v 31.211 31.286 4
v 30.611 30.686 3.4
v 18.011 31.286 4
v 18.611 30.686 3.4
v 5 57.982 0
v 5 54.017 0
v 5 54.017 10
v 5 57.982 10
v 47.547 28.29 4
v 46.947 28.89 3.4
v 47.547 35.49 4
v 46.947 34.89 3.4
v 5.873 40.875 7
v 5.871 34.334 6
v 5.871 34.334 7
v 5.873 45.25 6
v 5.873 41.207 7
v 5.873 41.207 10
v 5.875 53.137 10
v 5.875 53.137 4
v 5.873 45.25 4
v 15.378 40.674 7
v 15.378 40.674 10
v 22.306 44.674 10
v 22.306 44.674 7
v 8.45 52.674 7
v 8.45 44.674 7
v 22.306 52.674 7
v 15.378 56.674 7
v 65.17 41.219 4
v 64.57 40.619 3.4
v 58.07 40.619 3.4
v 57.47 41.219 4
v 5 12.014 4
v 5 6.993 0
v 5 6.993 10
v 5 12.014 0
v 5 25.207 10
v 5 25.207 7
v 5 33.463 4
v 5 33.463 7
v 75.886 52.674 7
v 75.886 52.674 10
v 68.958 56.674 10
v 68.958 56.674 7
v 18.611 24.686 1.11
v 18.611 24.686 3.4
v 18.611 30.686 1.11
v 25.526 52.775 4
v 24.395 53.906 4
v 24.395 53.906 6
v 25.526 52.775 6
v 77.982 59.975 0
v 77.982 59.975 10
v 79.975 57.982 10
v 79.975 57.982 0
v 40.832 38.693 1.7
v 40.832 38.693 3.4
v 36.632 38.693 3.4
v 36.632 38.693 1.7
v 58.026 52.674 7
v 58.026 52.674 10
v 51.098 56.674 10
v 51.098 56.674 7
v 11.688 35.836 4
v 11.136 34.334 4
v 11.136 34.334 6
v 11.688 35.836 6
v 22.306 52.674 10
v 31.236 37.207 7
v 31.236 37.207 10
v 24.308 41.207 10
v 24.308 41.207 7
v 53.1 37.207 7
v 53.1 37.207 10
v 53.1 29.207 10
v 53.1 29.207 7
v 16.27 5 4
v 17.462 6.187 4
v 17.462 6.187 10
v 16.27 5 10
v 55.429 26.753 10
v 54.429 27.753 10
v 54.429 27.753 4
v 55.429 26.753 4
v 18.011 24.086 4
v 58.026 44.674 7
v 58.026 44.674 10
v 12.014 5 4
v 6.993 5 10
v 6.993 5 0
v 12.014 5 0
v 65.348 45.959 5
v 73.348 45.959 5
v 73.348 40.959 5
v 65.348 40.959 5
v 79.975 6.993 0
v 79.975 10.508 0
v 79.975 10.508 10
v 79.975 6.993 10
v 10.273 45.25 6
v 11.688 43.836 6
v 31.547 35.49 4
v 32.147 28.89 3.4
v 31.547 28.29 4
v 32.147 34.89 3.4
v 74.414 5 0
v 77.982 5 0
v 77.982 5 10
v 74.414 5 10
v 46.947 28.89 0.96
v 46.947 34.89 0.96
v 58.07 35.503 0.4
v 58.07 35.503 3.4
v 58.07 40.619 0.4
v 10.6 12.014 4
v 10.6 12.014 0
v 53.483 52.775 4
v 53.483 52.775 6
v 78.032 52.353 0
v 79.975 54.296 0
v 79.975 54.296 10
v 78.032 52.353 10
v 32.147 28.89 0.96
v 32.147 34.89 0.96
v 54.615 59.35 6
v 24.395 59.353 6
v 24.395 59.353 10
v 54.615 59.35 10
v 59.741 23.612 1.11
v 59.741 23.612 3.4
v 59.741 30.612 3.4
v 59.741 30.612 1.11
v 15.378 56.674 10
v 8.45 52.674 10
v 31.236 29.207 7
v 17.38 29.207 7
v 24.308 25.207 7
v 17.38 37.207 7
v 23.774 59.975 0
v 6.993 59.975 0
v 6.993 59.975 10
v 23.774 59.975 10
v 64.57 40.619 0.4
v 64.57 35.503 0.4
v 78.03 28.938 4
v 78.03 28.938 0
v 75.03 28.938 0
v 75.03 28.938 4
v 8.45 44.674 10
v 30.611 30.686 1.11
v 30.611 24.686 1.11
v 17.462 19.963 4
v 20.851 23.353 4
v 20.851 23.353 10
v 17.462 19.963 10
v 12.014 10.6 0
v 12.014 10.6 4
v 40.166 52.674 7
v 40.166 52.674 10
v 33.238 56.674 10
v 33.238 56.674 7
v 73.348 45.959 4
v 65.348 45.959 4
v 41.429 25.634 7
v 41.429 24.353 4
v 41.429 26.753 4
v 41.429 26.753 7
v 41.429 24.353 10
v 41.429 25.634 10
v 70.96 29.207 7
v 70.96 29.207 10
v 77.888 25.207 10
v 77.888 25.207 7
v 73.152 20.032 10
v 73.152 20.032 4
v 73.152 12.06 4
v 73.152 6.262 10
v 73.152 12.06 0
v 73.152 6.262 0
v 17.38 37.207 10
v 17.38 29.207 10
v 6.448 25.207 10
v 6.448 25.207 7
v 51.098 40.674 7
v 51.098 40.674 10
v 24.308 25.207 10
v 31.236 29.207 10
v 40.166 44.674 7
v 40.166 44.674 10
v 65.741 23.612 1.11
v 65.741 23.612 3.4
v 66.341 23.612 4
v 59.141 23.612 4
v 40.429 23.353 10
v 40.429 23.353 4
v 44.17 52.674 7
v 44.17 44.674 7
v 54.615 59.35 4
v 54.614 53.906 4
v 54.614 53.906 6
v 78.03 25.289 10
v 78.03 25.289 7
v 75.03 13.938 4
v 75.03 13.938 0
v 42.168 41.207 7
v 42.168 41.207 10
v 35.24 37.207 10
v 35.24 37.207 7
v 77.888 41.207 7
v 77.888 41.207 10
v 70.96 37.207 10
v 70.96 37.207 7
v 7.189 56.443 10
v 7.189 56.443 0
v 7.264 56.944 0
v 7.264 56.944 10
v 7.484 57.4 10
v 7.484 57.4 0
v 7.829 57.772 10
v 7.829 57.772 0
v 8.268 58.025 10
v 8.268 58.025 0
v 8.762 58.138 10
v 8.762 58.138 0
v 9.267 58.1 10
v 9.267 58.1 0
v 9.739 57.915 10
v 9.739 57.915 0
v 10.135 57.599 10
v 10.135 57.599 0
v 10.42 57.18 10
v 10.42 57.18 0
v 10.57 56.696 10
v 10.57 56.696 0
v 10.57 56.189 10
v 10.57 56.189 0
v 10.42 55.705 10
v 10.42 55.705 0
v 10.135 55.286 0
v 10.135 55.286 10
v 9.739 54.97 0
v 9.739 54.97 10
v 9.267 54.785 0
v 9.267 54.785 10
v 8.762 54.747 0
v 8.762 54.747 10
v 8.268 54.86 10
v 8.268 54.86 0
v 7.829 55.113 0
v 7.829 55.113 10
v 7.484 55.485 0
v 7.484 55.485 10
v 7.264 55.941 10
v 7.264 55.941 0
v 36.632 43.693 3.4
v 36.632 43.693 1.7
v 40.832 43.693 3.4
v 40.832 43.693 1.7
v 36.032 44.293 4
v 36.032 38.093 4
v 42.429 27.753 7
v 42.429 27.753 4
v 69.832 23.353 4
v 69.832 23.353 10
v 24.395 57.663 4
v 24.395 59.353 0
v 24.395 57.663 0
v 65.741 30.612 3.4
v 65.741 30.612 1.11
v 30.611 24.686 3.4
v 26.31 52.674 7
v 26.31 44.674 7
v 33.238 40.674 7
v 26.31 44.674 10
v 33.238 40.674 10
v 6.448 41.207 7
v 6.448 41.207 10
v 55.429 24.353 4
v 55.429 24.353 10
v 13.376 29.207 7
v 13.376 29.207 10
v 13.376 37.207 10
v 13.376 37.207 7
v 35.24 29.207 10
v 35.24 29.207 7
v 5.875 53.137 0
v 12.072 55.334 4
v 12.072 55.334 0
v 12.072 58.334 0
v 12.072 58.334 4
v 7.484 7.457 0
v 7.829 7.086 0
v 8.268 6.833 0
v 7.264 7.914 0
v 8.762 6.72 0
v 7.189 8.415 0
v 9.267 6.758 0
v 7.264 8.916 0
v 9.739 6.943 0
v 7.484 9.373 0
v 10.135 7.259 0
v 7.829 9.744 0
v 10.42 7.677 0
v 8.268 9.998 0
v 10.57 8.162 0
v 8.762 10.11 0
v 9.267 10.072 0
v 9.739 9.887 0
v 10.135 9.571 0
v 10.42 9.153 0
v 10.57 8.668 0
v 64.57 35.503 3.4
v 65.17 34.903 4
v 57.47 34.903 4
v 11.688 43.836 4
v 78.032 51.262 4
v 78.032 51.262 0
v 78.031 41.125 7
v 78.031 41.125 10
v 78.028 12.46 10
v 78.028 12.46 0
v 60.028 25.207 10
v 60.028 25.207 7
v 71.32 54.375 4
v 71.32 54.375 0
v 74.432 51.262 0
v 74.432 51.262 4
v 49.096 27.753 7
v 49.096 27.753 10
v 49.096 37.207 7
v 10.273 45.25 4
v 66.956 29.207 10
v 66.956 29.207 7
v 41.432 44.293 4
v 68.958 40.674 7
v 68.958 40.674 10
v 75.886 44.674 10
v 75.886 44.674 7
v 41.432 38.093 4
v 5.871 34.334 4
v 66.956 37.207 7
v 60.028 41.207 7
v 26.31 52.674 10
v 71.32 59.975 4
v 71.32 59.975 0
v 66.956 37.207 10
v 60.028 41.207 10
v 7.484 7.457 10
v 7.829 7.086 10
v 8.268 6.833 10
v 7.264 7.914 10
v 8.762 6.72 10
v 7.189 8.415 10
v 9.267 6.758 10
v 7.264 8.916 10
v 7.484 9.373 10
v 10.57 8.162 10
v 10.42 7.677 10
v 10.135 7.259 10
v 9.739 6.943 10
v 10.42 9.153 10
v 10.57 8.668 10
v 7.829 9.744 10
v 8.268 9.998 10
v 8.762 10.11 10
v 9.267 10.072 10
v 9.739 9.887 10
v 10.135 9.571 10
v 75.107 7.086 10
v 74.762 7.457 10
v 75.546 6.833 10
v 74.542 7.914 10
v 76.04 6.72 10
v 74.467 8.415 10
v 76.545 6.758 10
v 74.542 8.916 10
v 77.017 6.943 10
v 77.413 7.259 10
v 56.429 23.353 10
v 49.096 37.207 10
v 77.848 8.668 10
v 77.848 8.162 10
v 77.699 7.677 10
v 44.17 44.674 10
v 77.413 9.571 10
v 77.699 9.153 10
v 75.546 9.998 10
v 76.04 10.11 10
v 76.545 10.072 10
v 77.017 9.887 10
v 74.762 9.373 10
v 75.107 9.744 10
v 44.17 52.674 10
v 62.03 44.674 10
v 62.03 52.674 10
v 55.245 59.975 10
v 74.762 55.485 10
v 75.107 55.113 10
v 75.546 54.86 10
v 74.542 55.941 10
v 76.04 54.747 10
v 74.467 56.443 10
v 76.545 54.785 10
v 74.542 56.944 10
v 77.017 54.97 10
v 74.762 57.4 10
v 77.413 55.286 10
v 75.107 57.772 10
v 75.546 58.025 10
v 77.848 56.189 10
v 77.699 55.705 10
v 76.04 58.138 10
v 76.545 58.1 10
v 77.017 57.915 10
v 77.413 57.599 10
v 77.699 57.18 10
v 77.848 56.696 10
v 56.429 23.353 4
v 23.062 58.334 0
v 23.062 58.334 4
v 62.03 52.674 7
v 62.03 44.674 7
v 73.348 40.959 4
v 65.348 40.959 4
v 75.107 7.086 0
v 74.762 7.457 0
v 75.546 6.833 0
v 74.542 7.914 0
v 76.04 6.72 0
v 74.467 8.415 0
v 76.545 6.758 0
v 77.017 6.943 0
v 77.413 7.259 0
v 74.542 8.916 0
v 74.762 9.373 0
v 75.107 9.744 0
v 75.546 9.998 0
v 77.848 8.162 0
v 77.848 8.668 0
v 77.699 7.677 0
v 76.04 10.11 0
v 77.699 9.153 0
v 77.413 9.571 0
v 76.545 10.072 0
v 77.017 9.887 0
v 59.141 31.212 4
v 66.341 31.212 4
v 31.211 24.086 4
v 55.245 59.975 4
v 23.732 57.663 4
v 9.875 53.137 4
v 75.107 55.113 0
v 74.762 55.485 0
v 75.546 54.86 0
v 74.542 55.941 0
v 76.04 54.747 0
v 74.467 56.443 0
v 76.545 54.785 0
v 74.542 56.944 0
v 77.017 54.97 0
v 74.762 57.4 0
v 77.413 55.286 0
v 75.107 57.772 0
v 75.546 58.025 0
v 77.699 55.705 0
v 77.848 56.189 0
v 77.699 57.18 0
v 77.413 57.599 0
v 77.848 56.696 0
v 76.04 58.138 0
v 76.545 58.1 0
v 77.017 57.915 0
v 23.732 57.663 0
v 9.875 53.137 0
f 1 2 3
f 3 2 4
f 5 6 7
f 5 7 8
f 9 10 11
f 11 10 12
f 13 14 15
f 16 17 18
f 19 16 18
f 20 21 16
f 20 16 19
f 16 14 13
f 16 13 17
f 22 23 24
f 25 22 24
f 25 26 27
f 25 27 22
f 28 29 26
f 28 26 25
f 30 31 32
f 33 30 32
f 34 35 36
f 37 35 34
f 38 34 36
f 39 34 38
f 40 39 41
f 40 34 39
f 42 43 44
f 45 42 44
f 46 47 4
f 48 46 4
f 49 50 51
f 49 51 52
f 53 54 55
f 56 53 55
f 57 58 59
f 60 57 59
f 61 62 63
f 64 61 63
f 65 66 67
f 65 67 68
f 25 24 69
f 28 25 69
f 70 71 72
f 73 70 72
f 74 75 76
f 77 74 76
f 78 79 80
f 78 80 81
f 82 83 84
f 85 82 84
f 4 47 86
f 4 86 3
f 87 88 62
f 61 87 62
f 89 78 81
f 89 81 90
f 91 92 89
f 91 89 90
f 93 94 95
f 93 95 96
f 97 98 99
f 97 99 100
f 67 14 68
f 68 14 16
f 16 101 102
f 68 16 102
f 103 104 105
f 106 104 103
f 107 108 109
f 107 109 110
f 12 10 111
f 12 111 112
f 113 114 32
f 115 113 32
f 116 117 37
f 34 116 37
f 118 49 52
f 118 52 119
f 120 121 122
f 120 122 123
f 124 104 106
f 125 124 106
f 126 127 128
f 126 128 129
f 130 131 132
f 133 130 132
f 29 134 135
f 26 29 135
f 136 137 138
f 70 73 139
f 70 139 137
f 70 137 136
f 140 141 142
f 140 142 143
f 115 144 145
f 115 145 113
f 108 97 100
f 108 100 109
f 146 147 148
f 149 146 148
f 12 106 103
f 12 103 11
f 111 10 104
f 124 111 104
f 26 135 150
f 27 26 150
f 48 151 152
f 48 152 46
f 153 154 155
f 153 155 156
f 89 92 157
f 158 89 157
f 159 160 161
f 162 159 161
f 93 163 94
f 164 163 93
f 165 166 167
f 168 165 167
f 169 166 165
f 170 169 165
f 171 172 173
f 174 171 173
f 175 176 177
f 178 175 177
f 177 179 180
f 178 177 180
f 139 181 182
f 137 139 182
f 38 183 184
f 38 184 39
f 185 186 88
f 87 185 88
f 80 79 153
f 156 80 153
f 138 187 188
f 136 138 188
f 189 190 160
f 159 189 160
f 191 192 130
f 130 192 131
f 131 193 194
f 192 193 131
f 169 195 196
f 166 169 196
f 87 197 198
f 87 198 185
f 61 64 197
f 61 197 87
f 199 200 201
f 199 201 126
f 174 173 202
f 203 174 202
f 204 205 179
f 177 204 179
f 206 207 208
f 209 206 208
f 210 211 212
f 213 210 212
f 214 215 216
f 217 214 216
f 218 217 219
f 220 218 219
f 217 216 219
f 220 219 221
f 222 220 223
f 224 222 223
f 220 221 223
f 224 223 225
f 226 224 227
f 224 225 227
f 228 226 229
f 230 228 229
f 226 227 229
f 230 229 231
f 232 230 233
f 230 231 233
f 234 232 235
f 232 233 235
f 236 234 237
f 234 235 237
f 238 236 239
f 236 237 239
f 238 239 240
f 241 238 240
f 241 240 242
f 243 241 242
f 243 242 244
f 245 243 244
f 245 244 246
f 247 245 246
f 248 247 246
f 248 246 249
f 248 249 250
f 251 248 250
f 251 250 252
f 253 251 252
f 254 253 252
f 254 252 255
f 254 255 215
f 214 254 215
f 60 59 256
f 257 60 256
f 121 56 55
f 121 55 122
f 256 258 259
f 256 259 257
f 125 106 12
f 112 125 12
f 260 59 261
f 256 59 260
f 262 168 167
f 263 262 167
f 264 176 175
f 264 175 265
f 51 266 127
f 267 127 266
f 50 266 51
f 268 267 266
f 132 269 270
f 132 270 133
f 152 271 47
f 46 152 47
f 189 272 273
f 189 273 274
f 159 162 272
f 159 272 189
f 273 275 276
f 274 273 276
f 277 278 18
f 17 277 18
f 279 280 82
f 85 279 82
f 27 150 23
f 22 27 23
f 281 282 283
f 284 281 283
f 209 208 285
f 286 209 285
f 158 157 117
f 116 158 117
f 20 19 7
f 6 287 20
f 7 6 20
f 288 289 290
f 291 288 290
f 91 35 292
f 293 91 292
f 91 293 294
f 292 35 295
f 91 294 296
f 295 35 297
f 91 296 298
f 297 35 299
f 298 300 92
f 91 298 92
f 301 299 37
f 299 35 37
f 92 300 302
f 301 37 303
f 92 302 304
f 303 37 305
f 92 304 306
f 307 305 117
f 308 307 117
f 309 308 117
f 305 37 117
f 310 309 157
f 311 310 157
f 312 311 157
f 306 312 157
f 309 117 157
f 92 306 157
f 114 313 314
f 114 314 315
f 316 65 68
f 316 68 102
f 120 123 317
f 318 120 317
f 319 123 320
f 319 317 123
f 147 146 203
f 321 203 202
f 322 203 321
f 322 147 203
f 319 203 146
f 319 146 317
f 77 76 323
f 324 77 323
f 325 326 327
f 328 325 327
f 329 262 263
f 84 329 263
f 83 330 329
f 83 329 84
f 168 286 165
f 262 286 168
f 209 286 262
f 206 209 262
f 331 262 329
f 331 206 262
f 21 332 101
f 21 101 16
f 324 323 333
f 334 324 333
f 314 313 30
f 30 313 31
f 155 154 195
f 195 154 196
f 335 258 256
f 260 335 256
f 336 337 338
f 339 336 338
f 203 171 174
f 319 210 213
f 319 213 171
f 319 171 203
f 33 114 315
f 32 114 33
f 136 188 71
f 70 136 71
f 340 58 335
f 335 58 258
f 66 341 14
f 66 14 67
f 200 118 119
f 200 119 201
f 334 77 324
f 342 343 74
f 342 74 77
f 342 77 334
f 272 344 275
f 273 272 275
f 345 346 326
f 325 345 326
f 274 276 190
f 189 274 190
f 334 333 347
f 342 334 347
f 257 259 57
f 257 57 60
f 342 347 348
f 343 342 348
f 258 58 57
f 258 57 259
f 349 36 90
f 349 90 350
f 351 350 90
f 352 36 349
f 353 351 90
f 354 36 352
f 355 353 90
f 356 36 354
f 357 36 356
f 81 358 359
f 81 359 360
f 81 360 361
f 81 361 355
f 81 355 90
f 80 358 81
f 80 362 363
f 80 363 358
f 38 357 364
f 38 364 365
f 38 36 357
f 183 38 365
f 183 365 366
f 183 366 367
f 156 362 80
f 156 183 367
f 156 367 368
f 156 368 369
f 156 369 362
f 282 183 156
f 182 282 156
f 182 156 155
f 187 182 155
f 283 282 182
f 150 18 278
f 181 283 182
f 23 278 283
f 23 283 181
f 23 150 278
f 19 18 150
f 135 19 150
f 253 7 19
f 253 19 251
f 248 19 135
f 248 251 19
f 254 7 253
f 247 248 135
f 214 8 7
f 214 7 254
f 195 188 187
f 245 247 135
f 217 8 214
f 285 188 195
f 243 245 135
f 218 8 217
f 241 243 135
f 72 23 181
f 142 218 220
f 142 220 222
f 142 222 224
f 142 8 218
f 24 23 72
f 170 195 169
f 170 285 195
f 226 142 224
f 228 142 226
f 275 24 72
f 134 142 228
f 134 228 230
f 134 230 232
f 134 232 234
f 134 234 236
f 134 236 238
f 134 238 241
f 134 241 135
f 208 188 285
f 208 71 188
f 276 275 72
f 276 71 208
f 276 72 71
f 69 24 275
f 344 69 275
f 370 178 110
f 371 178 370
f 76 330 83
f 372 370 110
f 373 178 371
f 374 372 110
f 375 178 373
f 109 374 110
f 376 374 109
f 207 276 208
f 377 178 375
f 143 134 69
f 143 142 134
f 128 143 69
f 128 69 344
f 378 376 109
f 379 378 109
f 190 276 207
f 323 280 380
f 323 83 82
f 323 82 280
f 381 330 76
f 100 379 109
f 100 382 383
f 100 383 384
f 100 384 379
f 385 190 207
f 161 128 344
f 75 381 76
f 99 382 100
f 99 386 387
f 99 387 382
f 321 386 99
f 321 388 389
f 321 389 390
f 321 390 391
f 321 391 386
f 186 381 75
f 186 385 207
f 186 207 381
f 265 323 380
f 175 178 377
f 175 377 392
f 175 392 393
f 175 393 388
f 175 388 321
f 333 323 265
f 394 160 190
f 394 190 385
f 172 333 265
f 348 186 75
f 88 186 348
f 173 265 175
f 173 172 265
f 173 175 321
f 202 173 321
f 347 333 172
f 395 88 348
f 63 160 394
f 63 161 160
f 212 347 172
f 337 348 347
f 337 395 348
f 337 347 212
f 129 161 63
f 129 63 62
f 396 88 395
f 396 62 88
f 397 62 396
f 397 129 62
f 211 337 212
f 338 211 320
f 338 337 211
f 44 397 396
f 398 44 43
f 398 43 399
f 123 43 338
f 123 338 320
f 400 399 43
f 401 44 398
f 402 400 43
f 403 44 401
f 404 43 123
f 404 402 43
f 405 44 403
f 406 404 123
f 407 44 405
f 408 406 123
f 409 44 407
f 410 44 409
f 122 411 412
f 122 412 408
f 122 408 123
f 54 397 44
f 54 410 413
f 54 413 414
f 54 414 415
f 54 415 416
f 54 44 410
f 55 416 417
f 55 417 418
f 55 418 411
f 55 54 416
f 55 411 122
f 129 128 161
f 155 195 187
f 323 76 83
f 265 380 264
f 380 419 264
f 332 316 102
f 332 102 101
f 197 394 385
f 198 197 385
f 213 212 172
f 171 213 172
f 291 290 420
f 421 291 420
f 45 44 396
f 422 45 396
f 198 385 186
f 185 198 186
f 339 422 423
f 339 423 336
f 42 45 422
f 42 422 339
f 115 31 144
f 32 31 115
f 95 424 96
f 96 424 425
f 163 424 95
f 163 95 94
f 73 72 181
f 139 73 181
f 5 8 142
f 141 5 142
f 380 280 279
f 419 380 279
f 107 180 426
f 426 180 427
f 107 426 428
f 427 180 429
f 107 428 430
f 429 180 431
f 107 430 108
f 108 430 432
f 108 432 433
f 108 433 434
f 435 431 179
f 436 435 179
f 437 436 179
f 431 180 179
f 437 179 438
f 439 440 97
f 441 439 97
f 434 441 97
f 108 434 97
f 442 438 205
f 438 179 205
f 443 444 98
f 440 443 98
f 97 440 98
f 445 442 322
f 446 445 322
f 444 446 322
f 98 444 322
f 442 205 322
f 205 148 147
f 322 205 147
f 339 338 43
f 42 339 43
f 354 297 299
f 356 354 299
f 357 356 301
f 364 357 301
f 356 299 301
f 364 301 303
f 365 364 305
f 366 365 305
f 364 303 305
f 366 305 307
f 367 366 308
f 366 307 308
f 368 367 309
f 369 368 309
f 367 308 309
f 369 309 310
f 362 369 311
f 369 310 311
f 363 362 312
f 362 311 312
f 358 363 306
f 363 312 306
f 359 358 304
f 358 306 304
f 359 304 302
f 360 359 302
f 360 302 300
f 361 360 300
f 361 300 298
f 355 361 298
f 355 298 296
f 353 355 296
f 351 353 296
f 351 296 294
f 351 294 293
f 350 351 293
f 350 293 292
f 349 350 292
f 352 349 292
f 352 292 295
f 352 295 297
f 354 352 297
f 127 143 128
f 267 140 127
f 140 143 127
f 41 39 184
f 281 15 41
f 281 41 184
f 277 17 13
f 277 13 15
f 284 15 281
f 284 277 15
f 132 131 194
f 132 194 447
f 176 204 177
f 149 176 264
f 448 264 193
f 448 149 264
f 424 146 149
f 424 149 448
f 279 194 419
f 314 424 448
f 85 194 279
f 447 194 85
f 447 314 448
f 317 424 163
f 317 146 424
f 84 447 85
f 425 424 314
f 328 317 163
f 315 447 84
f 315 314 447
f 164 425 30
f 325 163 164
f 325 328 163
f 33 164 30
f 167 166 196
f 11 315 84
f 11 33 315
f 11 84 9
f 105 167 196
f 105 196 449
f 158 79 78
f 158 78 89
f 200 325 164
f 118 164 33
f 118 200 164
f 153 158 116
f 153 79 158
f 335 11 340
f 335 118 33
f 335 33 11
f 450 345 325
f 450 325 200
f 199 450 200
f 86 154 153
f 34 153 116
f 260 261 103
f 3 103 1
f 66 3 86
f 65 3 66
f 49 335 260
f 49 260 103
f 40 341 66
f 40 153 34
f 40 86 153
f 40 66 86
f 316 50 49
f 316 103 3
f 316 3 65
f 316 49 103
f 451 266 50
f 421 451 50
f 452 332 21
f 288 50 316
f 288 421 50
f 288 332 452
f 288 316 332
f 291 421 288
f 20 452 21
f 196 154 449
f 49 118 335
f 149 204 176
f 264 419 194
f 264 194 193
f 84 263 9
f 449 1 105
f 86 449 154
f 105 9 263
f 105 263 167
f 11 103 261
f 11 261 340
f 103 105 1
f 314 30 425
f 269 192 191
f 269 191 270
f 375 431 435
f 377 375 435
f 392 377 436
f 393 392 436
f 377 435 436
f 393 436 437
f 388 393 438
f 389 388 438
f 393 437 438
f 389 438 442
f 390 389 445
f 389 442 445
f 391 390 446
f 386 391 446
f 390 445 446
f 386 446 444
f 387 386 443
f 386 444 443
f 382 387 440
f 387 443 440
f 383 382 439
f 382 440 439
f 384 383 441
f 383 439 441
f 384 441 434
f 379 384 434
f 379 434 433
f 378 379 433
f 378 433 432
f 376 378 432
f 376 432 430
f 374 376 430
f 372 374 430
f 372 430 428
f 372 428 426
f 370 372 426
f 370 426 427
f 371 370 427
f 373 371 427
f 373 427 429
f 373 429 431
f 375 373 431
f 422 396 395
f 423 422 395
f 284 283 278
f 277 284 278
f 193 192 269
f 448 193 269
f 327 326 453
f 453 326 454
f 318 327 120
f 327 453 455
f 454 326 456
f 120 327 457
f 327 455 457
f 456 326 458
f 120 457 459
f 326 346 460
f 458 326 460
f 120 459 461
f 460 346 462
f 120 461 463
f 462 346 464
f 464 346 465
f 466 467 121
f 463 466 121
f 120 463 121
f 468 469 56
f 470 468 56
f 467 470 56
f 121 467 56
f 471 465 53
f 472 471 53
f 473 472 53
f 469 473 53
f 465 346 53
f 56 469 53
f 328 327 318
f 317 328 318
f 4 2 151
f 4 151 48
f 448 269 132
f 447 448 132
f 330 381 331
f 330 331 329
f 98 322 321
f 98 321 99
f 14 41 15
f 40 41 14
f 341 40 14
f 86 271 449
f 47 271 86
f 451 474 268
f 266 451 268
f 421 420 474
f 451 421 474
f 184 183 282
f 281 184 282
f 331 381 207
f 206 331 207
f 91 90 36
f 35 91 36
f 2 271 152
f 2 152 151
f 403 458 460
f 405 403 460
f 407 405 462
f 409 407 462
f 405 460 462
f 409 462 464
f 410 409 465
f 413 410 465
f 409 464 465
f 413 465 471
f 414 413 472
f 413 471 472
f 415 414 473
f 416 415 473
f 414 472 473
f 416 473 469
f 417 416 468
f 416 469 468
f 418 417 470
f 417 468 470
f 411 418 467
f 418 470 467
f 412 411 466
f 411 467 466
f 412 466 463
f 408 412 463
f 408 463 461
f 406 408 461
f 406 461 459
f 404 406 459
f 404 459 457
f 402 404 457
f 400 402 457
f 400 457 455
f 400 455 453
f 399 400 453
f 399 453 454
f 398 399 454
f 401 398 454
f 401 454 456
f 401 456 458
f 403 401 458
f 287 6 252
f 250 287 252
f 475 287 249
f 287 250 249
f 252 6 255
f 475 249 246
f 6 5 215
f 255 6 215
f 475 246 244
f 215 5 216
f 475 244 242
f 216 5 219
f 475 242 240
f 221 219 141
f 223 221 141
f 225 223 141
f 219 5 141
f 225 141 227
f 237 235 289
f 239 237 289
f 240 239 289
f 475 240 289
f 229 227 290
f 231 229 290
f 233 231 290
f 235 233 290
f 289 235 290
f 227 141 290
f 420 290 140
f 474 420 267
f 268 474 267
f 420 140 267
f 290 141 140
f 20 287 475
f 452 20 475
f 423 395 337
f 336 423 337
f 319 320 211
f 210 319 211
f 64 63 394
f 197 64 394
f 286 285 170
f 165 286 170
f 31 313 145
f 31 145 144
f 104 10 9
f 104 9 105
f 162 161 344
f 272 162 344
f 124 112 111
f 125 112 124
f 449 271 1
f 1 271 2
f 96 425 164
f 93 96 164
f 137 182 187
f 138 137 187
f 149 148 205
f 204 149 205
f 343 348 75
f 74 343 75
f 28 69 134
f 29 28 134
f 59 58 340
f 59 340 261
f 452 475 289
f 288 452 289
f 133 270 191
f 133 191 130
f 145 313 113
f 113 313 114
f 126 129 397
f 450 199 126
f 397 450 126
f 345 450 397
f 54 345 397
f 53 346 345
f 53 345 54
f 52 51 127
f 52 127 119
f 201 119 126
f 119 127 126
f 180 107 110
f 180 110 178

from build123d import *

# Parameters (mm, degrees)
SKETCH_1_W           = 85
SKETCH_1_H           = 65
EXTRUDE_1_DEPTH      = 10
CUT_EXTRUDE_1_REACH  = 109.471
SKETCH_2_R           = 1.7
CUT_EXTRUDE_2_REACH  = 109.471
SKETCH_3_W           = 85
SKETCH_3_H           = 65
CUT_EXTRUDE_4_REACH  = 102.464
CUT_EXTRUDE_7_DEPTH  = 6
CUT_EXTRUDE_8_DEPTH  = 6
CUT_EXTRUDE_11_DEPTH = 4
SKETCH_8_W           = 8
SKETCH_8_H           = 5
CUT_EXTRUDE_12_DEPTH = 1
SKETCH_10_W          = 5.4
SKETCH_10_H          = 6
SKETCH_10_W_2        = 4
EXTRUDE_2_DEPTH      = 3.04
SKETCH_11_W          = 4.2
SKETCH_11_H          = 5
EXTRUDE_3_DEPTH      = 2.300115
SKETCH_12_W          = 12
SKETCH_12_H          = 6
EXTRUDE_4_DEPTH      = 2.89
SKETCH_13_W          = 6.499986347
SKETCH_13_H          = 5.115524378
EXTRUDE_5_DEPTH      = 3.6
SKETCH_14_W          = 6
SKETCH_14_H          = 7
EXTRUDE_6_DEPTH      = 2.890002
SKETCH_15_W          = 14
SKETCH_15_H          = 4.4
CUT_EXTRUDE_13_DEPTH = 6
CHAMFER_1_SIZE       = 1
CHAMFER_2_SIZE       = 0.6
CHAMFER_3_SIZE       = 0.6
CHAMFER_4_SIZE       = 0.6
CHAMFER_5_SIZE       = 0.6
CHAMFER_6_SIZE       = 0.6
CUT_EXTRUDE_15_DEPTH = 3
CUT_EXTRUDE_16_DEPTH = 3


with BuildPart() as part:
    # 草图1 → 凸台-拉伸1 (new body)
    with BuildSketch(Plane.XY):
        with Locations((42.5, 32.5)):
            Rectangle(SKETCH_1_W, SKETCH_1_H)
    extrude(amount=EXTRUDE_1_DEPTH)

    # 草图2 → 切除-拉伸1 (cut, up to next)
    with BuildSketch(Plane(origin=(0, 0, 0), x_dir=(-1, 0, 0), z_dir=(0, 0, -1)), mode=Mode.PRIVATE) as cut_extrude_1_sk1:
        with Locations((-76.166921514, 56.442524765)):
            Circle(SKETCH_2_R)
    cut_extrude_1_tool1 = extrude(cut_extrude_1_sk1.sketch, amount=-CUT_EXTRUDE_1_REACH, mode=Mode.PRIVATE) & part.part
    # 草图2 → 切除-拉伸1 (cut, up to next)
    with BuildSketch(Plane(origin=(0, 0, 0), x_dir=(-1, 0, 0), z_dir=(0, 0, -1)), mode=Mode.PRIVATE) as cut_extrude_1_sk2:
        with Locations((-8.888803658, 56.442524765)):
            Circle(SKETCH_2_R)
    cut_extrude_1_tool2 = extrude(cut_extrude_1_sk2.sketch, amount=-CUT_EXTRUDE_1_REACH, mode=Mode.PRIVATE) & part.part
    # 草图2 → 切除-拉伸1 (cut, up to next)
    with BuildSketch(Plane(origin=(0, 0, 0), x_dir=(-1, 0, 0), z_dir=(0, 0, -1)), mode=Mode.PRIVATE) as cut_extrude_1_sk3:
        with Locations((-76.166921514, 8.41508509)):
            Circle(SKETCH_2_R)
    cut_extrude_1_tool3 = extrude(cut_extrude_1_sk3.sketch, amount=-CUT_EXTRUDE_1_REACH, mode=Mode.PRIVATE) & part.part
    # 草图2 → 切除-拉伸1 (cut, up to next)
    with BuildSketch(Plane(origin=(0, 0, 0), x_dir=(-1, 0, 0), z_dir=(0, 0, -1)), mode=Mode.PRIVATE) as cut_extrude_1_sk4:
        with Locations((-8.888803658, 8.41508509)):
            Circle(SKETCH_2_R)
    cut_extrude_1_tool4 = extrude(cut_extrude_1_sk4.sketch, amount=-CUT_EXTRUDE_1_REACH, mode=Mode.PRIVATE) & part.part
    add(cut_extrude_1_tool1.solids().sort_by_distance((76.166922, 56.442525, 0))[0], mode=Mode.SUBTRACT)
    add(cut_extrude_1_tool2.solids().sort_by_distance((8.888804, 56.442525, 0))[0], mode=Mode.SUBTRACT)
    add(cut_extrude_1_tool3.solids().sort_by_distance((76.166922, 8.415085, 0))[0], mode=Mode.SUBTRACT)
    add(cut_extrude_1_tool4.solids().sort_by_distance((8.888804, 8.415085, 0))[0], mode=Mode.SUBTRACT)

    # 草图3 → 切除-拉伸2 (cut, up to next)
    with BuildSketch(Plane(origin=(0, 0, 0), x_dir=(-1, 0, 0), z_dir=(0, 0, -1)), mode=Mode.PRIVATE) as cut_extrude_2_sk1:
        with Locations((-42.5, 32.5)):
            Rectangle(SKETCH_3_W, SKETCH_3_H)
        Polygon((-5, 33.462892894), (-5.871324699, 34.334217592), (-5.87504445, 53.137061214), (-5, 54.017366187), (-5, 57.982143592), (-6.992565577, 59.974709169), (-23.773560915, 59.974709169), (-24.394872914, 59.353397171), (-54.61482093, 59.349677419), (-55.245113202, 59.974709169), (-77.982184232, 59.974709169), (-79.974749809, 57.982143592), (-79.97474981, 54.295829484), (-78.032030648, 52.353110322), (-78.028310897, 12.45999492), (-79.97474981, 10.508295484), (-79.97474981, 6.992565577), (-77.982184232, 5), (-74.414239441, 5), (-73.152434681, 6.26180476), (-60.043505207, 6.265524511), (-58.772720173, 5), (-32.926479725, 5), (-31.743585303, 6.182894422), (-17.461559563, 6.186614173), (-16.269684867, 5), (-6.992565577, 5), (-5, 6.992565577), align=None, mode=Mode.SUBTRACT)
    cut_extrude_2_tool1 = extrude(cut_extrude_2_sk1.sketch, amount=-CUT_EXTRUDE_2_REACH, mode=Mode.PRIVATE) & part.part
    add(cut_extrude_2_tool1.solids().sort_by_distance((42.5, 63.929953, 0))[0], mode=Mode.SUBTRACT)

    # 草图4 → 切除-拉伸4 (cut, up to next)
    with BuildSketch(Plane(origin=(0, 0, 0), x_dir=(-1, 0, 0), z_dir=(0, 0, -1)), mode=Mode.PRIVATE) as cut_extrude_4_sk1:
        Polygon((-73.152434681, 6.26180476), (-73.152434681, 20.032317315), (-69.831576581, 23.353175415), (-46.787984184, 23.353175415), (-20.851296271, 23.353175415), (-17.461559563, 19.963438707), (-17.461559563, 6.186614173), (-17.461559563, 0.193960815), (-73.152434681, 0.193960815), align=None)
    cut_extrude_4_tool1 = extrude(cut_extrude_4_sk1.sketch, amount=-CUT_EXTRUDE_4_REACH, mode=Mode.PRIVATE) & part.part
    add(cut_extrude_4_tool1.solids().sort_by_distance((45.311727, 11.681443, 0))[0], mode=Mode.SUBTRACT)

    # 草图5 → 切除-拉伸7 (cut)
    with BuildSketch(Plane(origin=(0, 0, 0), x_dir=(-1, 0, 0), z_dir=(0, 0, -1))):
        Polygon((-24.394872914, 59.353397171), (-24.394872914, 53.906418167), (-25.526104495, 52.774908066), (-53.482640788, 52.774908066), (-54.614150889, 53.906139647), (-54.61482093, 59.349677419), align=None)
    extrude(amount=-CUT_EXTRUDE_7_DEPTH, mode=Mode.SUBTRACT)

    # 草图6 → 切除-拉伸8 (cut)
    with BuildSketch(Plane(origin=(0, 0, 0), x_dir=(-1, 0, 0), z_dir=(0, 0, -1))):
        Polygon((-5.871324699, 34.334217592), (-11.136213102, 34.334217592), (-11.687697798, 35.836171197), (-11.687697798, 43.836171197), (-10.273484235, 45.250384759), (-5.873484235, 45.250384759), align=None)
    extrude(amount=-CUT_EXTRUDE_8_DEPTH, mode=Mode.SUBTRACT)

    # 草图7 → 切除-拉伸11 (cut)
    with BuildSketch(Plane(origin=(0, 0, 0), x_dir=(-1, 0, 0), z_dir=(0, 0, -1))):
        Polygon((-74.432117646, 51.26230094), (-76.432117646, 51.26230094), (-78.031928938, 51.26230094), (-78.029847328, 28.93771831), (-75.029847328, 28.93771831), (-75.029847328, 13.93771831), (-73.152434681, 12.060305663), (-73.152434681, 20.032317315), (-69.831576581, 23.353175415), (-20.851296271, 23.353175415), (-17.461559563, 19.963438707), (-17.461559563, 6.186614173), (-16.269684867, 5), (-12.014024847, 5), (-12.014024847, 10.599811284), (-10.599811284, 12.014024847), (-6.599811284, 12.014024847), (-5, 12.014024847), (-5, 33.462892894), (-5.871324699, 34.334217592), (-11.136213102, 34.334217592), (-11.687697798, 35.836171197), (-11.687697798, 43.836171197), (-10.273484235, 45.250384759), (-5.873484235, 45.250384759), (-5.87504445, 53.137061214), (-9.87504445, 53.137061214), (-12.071959353, 55.333976117), (-12.071959353, 58.333976117), (-23.061659554, 58.333976117), (-23.732127818, 57.663342778), (-24.394872914, 57.663261201), (-24.394872914, 53.906418167), (-25.526104495, 52.774908066), (-53.482640788, 52.774908066), (-54.614150889, 53.906139647), (-54.61482093, 59.349677419), (-55.245113202, 59.974709169), (-71.319520701, 59.974709169), (-71.319520701, 58.374897885), (-71.319520701, 54.374897885), align=None)
    extrude(amount=-CUT_EXTRUDE_11_DEPTH, mode=Mode.SUBTRACT)

    # 草图8 → 切除-拉伸12 (cut)
    with BuildSketch(Plane(origin=(0, 0, 4), x_dir=(-1, 0, 0), z_dir=(0, 0, -1))):
        with Locations((-69.348077333, 43.45871309)):
            Rectangle(SKETCH_8_W, SKETCH_8_H)
    extrude(amount=-CUT_EXTRUDE_12_DEPTH, mode=Mode.SUBTRACT)

    # 草图10 → 凸台-拉伸2 (add)
    with BuildSketch(Plane(origin=(0, 0, 4), x_dir=(-1, 0, 0), z_dir=(0, 0, -1))):
        with Locations((-44.246532103, 31.889800214)):
            Rectangle(SKETCH_10_W, SKETCH_10_H)
        with Locations((-39.546532103, 31.889800214)):
            Rectangle(SKETCH_10_W_2, SKETCH_10_H)
        with Locations((-34.846532103, 31.889800214)):
            Rectangle(SKETCH_10_W, SKETCH_10_H)
    extrude(amount=EXTRUDE_2_DEPTH)

    # 草图11 → 凸台-拉伸3 (add)
    with BuildSketch(Plane(origin=(0, 0, 4), x_dir=(-1, 0, 0), z_dir=(0, 0, -1))):
        with Locations((-38.731800654, 41.192864876)):
            Rectangle(SKETCH_11_W, SKETCH_11_H)
    extrude(amount=EXTRUDE_3_DEPTH)

    # 草图12 → 凸台-拉伸4 (add)
    with BuildSketch(Plane(origin=(0, 0, 4), x_dir=(-1, 0, 0), z_dir=(0, 0, -1))):
        with Locations((-24.610605003, 27.685920752)):
            Rectangle(SKETCH_12_W, SKETCH_12_H)
    extrude(amount=EXTRUDE_4_DEPTH)

    # 草图13 → 凸台-拉伸5 (add)
    with BuildSketch(Plane(origin=(0, 0, 4), x_dir=(-1, 0, 0), z_dir=(0, 0, -1))):
        with Locations((-61.319842519, 38.061085021)):
            Rectangle(SKETCH_13_W, SKETCH_13_H)
    extrude(amount=EXTRUDE_5_DEPTH)

    # 草图14 → 凸台-拉伸6 (add)
    with BuildSketch(Plane(origin=(0, 0, 4), x_dir=(-1, 0, 0), z_dir=(0, 0, -1))):
        with Locations((-62.740849727, 27.111901224)):
            Rectangle(SKETCH_14_W, SKETCH_14_H)
    extrude(amount=EXTRUDE_6_DEPTH)

    # 草图15 → 切除-拉伸13 (cut)
    with BuildSketch(Plane.XY.offset(10)):
        with Locations((48.428848604, 25.553175415)):
            Rectangle(SKETCH_15_W, SKETCH_15_H)
    extrude(amount=-CUT_EXTRUDE_13_DEPTH, mode=Mode.SUBTRACT)

    # 倒角1
    chamfer_1_edges = [part.edges().sort_by_distance(p)[0] for p in [
        (55.428848604, 23.353175415, 7),
        (55.428848604, 27.753175415, 7),
        (41.428848604, 27.753175415, 7),
        (41.428848604, 23.353175415, 7),
    ]]
    chamfer(chamfer_1_edges, length=CHAMFER_1_SIZE)

    # 倒角2
    chamfer_2_edges = [part.edges().sort_by_distance(p)[0] for p in [
        (64.569835693, 38.061085021, 4),
        (61.31984252, 35.503322832, 4),
        (58.069849346, 38.061085021, 4),
        (61.31984252, 40.61884721, 4),
    ]]
    chamfer(chamfer_2_edges, length=CHAMFER_2_SIZE)

    # 倒角3
    chamfer_3_edges = [part.edges().sort_by_distance(p)[0] for p in [
        (39.546532103, 28.889800214, 4),
        (46.946532103, 31.889800214, 4),
        (39.546532103, 34.889800214, 4),
        (32.146532103, 31.889800214, 4),
    ]]
    chamfer(chamfer_3_edges, length=CHAMFER_3_SIZE)

    # 倒角4
    chamfer_4_edges = [part.edges().sort_by_distance(p)[0] for p in [
        (30.610605003, 27.685920752, 4),
        (24.610605003, 24.685920752, 4),
        (18.610605003, 27.685920752, 4),
        (24.610605003, 30.685920752, 4),
    ]]
    chamfer(chamfer_4_edges, length=CHAMFER_4_SIZE)

    # 倒角5
    chamfer_5_edges = [part.edges().sort_by_distance(p)[0] for p in [
        (40.831800654, 41.192864876, 4),
        (38.731800654, 38.692864876, 4),
        (36.631800654, 41.192864876, 4),
        (38.731800654, 43.692864876, 4),
    ]]
    chamfer(chamfer_5_edges, length=CHAMFER_5_SIZE)

    # 倒角6
    chamfer_6_edges = [part.edges().sort_by_distance(p)[0] for p in [
        (65.740849727, 27.111901224, 4),
        (59.740849727, 27.111901224, 4),
        (62.740849727, 30.611901224, 4),
    ]]
    chamfer(chamfer_6_edges, length=CHAMFER_6_SIZE)

    # 草图17 → 切除-拉伸15 (cut)
    with BuildSketch(Plane.XY.offset(10)):
        Polygon((40.166139484, 44.674395647), (40.166139484, 52.674395647), (33.237936254, 56.674395647), (26.309733024, 52.674395647), (26.309733024, 44.674395647), (33.237936254, 40.674395647), align=None)
        Polygon((22.306139484, 44.674395647), (22.306139484, 52.674395647), (15.377936254, 56.674395647), (8.449733024, 52.674395647), (8.449733024, 44.674395647), (15.377936254, 40.674395647), align=None)
        Polygon((58.026139484, 44.674395647), (58.026139484, 52.674395647), (51.097936254, 56.674395647), (44.169733024, 52.674395647), (44.169733024, 44.674395647), (51.097936254, 40.674395647), align=None)
        Polygon((75.886139484, 44.674395647), (75.886139484, 52.674395647), (68.957936254, 56.674395647), (62.029733024, 52.674395647), (62.029733024, 44.674395647), (68.957936254, 40.674395647), align=None)
        Polygon((93.746139484, 44.674395647), (93.746139484, 52.674395647), (86.817936254, 56.674395647), (79.889733024, 52.674395647), (79.889733024, 44.674395647), (86.817936254, 40.674395647), align=None)
        Polygon((31.236139484, 29.207181935), (31.236139484, 37.207181935), (24.307936254, 41.207181935), (17.379733024, 37.207181935), (17.379733024, 29.207181935), (24.307936254, 25.207181935), align=None)
        Polygon((49.096139484, 29.207181935), (49.096139484, 37.207181935), (42.167936254, 41.207181935), (35.239733024, 37.207181935), (35.239733024, 29.207181935), (42.167936254, 25.207181935), align=None)
        Polygon((66.956139484, 29.207181935), (66.956139484, 37.207181935), (60.027936254, 41.207181935), (53.099733024, 37.207181935), (53.099733024, 29.207181935), (60.027936254, 25.207181935), align=None)
        Polygon((84.816139484, 29.207181935), (84.816139484, 37.207181935), (77.887936254, 41.207181935), (70.959733024, 37.207181935), (70.959733024, 29.207181935), (77.887936254, 25.207181935), align=None)
        Polygon((13.376139484, 29.207181935), (13.376139484, 37.207181935), (6.447936254, 41.207181935), (-0.480266976, 37.207181935), (-0.480266976, 29.207181935), (6.447936254, 25.207181935), align=None)
    extrude(amount=-CUT_EXTRUDE_15_DEPTH, mode=Mode.SUBTRACT)

    # 草图18 → 切除-拉伸16 (cut)
    with BuildSketch(Plane.XY.offset(10)):
        Polygon((6.447936254, 41.207181935), (5.872684372, 41.207181935), (5.872618661, 40.875022168), align=None)
        Polygon((6.447936254, 25.207181935), (5, 25.207181935), (5, 26.043148321), align=None)
        Polygon((49.096139484, 29.207181935), (49.096139484, 27.753175415), (46.577726316, 27.753175415), align=None)
    extrude(amount=-CUT_EXTRUDE_16_DEPTH, mode=Mode.SUBTRACT)


solid = part.part
